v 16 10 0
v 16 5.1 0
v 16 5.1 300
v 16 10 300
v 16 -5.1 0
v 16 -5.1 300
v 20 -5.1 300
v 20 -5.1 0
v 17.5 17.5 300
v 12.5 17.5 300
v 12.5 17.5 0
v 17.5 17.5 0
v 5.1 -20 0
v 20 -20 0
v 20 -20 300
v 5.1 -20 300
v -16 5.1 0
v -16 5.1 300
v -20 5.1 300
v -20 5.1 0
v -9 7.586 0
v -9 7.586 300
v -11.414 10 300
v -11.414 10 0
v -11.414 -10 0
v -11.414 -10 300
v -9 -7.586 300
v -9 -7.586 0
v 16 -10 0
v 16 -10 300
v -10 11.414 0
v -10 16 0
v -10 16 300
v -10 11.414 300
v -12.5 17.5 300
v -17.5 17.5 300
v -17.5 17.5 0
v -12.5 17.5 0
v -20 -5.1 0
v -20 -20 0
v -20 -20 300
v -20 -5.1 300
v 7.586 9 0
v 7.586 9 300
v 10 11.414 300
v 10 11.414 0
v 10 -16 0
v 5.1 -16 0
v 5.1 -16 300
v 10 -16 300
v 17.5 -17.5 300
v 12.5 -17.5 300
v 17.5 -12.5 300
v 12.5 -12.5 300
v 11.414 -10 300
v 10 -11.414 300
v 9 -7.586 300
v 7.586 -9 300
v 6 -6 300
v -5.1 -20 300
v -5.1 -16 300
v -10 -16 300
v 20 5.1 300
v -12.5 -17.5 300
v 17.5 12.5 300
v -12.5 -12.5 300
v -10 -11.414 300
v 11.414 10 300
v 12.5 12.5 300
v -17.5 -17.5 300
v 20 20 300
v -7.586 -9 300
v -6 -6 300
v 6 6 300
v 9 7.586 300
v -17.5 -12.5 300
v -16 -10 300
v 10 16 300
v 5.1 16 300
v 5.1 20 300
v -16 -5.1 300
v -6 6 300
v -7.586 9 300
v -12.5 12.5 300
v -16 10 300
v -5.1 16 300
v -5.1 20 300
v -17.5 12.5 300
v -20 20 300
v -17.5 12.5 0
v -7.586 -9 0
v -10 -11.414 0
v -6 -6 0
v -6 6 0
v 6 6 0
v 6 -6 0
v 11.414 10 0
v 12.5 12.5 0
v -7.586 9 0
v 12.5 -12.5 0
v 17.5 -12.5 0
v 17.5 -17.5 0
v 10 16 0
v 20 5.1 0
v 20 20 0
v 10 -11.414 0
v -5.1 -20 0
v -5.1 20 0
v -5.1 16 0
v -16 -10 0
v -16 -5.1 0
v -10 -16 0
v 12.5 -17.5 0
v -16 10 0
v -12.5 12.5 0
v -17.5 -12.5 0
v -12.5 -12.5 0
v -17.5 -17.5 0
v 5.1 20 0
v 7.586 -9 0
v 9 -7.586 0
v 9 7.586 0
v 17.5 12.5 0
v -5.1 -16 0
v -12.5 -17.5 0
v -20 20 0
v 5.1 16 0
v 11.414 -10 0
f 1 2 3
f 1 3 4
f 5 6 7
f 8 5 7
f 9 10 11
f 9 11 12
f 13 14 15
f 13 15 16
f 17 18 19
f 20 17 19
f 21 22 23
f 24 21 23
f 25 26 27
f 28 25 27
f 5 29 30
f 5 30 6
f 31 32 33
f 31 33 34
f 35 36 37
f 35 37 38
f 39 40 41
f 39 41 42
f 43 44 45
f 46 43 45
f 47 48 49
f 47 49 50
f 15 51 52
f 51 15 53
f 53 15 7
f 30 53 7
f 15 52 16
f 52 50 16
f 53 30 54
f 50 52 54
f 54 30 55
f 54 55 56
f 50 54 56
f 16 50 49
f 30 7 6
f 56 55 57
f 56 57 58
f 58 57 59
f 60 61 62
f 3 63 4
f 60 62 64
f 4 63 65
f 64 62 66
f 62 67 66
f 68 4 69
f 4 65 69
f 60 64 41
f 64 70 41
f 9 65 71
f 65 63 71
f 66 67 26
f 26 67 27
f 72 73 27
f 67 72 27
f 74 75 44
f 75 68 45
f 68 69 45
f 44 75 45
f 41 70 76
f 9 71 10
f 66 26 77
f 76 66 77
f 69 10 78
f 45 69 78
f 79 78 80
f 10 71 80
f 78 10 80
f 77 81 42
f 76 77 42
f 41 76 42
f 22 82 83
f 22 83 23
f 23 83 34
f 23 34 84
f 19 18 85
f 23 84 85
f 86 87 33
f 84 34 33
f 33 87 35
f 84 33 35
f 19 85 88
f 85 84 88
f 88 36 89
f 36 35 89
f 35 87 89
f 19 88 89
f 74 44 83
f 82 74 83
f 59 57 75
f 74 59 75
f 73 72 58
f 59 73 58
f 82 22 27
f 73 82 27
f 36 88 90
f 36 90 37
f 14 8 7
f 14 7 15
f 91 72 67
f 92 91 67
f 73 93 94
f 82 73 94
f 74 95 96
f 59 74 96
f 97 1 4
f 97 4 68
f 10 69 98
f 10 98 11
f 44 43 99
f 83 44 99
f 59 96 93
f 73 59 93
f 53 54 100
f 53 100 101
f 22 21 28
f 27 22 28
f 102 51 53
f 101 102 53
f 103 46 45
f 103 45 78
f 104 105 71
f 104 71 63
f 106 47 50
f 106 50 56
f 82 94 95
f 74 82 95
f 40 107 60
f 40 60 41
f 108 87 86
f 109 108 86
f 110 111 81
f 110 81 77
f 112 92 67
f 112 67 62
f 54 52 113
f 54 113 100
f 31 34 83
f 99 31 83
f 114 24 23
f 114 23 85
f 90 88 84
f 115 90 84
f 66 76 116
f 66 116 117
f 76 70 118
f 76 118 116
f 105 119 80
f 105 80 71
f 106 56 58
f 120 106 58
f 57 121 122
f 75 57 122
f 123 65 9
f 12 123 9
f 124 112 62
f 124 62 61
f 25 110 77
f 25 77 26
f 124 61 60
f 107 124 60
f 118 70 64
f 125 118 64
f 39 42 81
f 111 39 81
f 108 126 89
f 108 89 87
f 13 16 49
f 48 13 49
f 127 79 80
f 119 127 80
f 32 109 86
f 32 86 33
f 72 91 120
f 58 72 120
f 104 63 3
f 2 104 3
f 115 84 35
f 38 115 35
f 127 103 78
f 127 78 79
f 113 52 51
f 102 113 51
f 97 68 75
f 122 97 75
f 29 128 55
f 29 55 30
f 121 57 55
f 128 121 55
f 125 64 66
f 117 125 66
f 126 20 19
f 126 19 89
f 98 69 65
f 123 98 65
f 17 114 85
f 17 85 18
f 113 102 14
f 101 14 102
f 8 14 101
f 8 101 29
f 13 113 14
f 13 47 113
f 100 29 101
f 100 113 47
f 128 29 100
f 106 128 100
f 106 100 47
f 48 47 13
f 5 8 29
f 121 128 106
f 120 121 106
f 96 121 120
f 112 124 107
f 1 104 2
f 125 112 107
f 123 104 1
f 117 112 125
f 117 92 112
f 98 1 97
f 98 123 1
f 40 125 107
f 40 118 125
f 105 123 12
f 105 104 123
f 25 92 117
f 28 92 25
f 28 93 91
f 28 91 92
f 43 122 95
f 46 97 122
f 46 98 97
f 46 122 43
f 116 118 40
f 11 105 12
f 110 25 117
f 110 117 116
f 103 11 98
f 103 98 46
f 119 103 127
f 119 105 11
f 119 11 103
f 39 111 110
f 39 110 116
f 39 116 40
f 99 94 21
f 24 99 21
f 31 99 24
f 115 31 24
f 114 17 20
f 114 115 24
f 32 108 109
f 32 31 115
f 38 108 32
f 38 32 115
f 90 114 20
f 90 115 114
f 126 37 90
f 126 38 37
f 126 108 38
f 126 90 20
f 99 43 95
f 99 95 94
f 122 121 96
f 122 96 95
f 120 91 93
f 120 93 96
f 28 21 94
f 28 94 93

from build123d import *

# Parameters (mm, degrees)
ESQUISSE1_W        = 5
ESQUISSE1_H        = 5
BOSS_EXTRU_1_DEPTH = 300


with BuildPart() as part:
    # Esquisse1 → Boss.-Extru.1 (new body)
    with BuildSketch(Plane.XY):
        Polygon((0, 9), (7.585786438, 9), (10, 11.414213562), (10, 16), (5.1, 16), (5.1, 20), (20, 20), (20, 5.1), (16, 5.1), (16, 10), (11.414213562, 10), (9, 7.585786438), (9, 0), (9, -7.585786438), (11.414213562, -10), (16, -10), (16, -5.1), (20, -5.1), (20, -20), (5.1, -20), (5.1, -16), (10, -16), (10, -11.414213562), (7.585786438, -9), (0, -9), (-7.585786438, -9), (-10, -11.414213562), (-10, -16), (-5.1, -16), (-5.1, -20), (-20, -20), (-20, -5.1), (-16, -5.1), (-16, -10), (-11.414213562, -10), (-9, -7.585786438), (-9, 0), (-9, 7.585786438), (-11.414213562, 10), (-16, 10), (-16, 5.1), (-20, 5.1), (-20, 20), (-5.1, 20), (-5.1, 16), (-10, 16), (-10, 11.414213562), (-7.585786438, 9), align=None)
        with Locations((15, 15)):
            Rectangle(ESQUISSE1_W, ESQUISSE1_H, mode=Mode.SUBTRACT)
        Polygon((0, 6), (6, 6), (6, 0), (6, -6), (0, -6), (-6, -6), (-6, 0), (-6, 6), align=None, mode=Mode.SUBTRACT)
        with Locations((15, -15)):
            Rectangle(ESQUISSE1_W, ESQUISSE1_H, mode=Mode.SUBTRACT)
        with Locations((-15, -15)):
            Rectangle(ESQUISSE1_W, ESQUISSE1_H, mode=Mode.SUBTRACT)
        with Locations((-15, 15)):
            Rectangle(ESQUISSE1_W, ESQUISSE1_H, mode=Mode.SUBTRACT)
    extrude(amount=BOSS_EXTRU_1_DEPTH)


solid = part.part
